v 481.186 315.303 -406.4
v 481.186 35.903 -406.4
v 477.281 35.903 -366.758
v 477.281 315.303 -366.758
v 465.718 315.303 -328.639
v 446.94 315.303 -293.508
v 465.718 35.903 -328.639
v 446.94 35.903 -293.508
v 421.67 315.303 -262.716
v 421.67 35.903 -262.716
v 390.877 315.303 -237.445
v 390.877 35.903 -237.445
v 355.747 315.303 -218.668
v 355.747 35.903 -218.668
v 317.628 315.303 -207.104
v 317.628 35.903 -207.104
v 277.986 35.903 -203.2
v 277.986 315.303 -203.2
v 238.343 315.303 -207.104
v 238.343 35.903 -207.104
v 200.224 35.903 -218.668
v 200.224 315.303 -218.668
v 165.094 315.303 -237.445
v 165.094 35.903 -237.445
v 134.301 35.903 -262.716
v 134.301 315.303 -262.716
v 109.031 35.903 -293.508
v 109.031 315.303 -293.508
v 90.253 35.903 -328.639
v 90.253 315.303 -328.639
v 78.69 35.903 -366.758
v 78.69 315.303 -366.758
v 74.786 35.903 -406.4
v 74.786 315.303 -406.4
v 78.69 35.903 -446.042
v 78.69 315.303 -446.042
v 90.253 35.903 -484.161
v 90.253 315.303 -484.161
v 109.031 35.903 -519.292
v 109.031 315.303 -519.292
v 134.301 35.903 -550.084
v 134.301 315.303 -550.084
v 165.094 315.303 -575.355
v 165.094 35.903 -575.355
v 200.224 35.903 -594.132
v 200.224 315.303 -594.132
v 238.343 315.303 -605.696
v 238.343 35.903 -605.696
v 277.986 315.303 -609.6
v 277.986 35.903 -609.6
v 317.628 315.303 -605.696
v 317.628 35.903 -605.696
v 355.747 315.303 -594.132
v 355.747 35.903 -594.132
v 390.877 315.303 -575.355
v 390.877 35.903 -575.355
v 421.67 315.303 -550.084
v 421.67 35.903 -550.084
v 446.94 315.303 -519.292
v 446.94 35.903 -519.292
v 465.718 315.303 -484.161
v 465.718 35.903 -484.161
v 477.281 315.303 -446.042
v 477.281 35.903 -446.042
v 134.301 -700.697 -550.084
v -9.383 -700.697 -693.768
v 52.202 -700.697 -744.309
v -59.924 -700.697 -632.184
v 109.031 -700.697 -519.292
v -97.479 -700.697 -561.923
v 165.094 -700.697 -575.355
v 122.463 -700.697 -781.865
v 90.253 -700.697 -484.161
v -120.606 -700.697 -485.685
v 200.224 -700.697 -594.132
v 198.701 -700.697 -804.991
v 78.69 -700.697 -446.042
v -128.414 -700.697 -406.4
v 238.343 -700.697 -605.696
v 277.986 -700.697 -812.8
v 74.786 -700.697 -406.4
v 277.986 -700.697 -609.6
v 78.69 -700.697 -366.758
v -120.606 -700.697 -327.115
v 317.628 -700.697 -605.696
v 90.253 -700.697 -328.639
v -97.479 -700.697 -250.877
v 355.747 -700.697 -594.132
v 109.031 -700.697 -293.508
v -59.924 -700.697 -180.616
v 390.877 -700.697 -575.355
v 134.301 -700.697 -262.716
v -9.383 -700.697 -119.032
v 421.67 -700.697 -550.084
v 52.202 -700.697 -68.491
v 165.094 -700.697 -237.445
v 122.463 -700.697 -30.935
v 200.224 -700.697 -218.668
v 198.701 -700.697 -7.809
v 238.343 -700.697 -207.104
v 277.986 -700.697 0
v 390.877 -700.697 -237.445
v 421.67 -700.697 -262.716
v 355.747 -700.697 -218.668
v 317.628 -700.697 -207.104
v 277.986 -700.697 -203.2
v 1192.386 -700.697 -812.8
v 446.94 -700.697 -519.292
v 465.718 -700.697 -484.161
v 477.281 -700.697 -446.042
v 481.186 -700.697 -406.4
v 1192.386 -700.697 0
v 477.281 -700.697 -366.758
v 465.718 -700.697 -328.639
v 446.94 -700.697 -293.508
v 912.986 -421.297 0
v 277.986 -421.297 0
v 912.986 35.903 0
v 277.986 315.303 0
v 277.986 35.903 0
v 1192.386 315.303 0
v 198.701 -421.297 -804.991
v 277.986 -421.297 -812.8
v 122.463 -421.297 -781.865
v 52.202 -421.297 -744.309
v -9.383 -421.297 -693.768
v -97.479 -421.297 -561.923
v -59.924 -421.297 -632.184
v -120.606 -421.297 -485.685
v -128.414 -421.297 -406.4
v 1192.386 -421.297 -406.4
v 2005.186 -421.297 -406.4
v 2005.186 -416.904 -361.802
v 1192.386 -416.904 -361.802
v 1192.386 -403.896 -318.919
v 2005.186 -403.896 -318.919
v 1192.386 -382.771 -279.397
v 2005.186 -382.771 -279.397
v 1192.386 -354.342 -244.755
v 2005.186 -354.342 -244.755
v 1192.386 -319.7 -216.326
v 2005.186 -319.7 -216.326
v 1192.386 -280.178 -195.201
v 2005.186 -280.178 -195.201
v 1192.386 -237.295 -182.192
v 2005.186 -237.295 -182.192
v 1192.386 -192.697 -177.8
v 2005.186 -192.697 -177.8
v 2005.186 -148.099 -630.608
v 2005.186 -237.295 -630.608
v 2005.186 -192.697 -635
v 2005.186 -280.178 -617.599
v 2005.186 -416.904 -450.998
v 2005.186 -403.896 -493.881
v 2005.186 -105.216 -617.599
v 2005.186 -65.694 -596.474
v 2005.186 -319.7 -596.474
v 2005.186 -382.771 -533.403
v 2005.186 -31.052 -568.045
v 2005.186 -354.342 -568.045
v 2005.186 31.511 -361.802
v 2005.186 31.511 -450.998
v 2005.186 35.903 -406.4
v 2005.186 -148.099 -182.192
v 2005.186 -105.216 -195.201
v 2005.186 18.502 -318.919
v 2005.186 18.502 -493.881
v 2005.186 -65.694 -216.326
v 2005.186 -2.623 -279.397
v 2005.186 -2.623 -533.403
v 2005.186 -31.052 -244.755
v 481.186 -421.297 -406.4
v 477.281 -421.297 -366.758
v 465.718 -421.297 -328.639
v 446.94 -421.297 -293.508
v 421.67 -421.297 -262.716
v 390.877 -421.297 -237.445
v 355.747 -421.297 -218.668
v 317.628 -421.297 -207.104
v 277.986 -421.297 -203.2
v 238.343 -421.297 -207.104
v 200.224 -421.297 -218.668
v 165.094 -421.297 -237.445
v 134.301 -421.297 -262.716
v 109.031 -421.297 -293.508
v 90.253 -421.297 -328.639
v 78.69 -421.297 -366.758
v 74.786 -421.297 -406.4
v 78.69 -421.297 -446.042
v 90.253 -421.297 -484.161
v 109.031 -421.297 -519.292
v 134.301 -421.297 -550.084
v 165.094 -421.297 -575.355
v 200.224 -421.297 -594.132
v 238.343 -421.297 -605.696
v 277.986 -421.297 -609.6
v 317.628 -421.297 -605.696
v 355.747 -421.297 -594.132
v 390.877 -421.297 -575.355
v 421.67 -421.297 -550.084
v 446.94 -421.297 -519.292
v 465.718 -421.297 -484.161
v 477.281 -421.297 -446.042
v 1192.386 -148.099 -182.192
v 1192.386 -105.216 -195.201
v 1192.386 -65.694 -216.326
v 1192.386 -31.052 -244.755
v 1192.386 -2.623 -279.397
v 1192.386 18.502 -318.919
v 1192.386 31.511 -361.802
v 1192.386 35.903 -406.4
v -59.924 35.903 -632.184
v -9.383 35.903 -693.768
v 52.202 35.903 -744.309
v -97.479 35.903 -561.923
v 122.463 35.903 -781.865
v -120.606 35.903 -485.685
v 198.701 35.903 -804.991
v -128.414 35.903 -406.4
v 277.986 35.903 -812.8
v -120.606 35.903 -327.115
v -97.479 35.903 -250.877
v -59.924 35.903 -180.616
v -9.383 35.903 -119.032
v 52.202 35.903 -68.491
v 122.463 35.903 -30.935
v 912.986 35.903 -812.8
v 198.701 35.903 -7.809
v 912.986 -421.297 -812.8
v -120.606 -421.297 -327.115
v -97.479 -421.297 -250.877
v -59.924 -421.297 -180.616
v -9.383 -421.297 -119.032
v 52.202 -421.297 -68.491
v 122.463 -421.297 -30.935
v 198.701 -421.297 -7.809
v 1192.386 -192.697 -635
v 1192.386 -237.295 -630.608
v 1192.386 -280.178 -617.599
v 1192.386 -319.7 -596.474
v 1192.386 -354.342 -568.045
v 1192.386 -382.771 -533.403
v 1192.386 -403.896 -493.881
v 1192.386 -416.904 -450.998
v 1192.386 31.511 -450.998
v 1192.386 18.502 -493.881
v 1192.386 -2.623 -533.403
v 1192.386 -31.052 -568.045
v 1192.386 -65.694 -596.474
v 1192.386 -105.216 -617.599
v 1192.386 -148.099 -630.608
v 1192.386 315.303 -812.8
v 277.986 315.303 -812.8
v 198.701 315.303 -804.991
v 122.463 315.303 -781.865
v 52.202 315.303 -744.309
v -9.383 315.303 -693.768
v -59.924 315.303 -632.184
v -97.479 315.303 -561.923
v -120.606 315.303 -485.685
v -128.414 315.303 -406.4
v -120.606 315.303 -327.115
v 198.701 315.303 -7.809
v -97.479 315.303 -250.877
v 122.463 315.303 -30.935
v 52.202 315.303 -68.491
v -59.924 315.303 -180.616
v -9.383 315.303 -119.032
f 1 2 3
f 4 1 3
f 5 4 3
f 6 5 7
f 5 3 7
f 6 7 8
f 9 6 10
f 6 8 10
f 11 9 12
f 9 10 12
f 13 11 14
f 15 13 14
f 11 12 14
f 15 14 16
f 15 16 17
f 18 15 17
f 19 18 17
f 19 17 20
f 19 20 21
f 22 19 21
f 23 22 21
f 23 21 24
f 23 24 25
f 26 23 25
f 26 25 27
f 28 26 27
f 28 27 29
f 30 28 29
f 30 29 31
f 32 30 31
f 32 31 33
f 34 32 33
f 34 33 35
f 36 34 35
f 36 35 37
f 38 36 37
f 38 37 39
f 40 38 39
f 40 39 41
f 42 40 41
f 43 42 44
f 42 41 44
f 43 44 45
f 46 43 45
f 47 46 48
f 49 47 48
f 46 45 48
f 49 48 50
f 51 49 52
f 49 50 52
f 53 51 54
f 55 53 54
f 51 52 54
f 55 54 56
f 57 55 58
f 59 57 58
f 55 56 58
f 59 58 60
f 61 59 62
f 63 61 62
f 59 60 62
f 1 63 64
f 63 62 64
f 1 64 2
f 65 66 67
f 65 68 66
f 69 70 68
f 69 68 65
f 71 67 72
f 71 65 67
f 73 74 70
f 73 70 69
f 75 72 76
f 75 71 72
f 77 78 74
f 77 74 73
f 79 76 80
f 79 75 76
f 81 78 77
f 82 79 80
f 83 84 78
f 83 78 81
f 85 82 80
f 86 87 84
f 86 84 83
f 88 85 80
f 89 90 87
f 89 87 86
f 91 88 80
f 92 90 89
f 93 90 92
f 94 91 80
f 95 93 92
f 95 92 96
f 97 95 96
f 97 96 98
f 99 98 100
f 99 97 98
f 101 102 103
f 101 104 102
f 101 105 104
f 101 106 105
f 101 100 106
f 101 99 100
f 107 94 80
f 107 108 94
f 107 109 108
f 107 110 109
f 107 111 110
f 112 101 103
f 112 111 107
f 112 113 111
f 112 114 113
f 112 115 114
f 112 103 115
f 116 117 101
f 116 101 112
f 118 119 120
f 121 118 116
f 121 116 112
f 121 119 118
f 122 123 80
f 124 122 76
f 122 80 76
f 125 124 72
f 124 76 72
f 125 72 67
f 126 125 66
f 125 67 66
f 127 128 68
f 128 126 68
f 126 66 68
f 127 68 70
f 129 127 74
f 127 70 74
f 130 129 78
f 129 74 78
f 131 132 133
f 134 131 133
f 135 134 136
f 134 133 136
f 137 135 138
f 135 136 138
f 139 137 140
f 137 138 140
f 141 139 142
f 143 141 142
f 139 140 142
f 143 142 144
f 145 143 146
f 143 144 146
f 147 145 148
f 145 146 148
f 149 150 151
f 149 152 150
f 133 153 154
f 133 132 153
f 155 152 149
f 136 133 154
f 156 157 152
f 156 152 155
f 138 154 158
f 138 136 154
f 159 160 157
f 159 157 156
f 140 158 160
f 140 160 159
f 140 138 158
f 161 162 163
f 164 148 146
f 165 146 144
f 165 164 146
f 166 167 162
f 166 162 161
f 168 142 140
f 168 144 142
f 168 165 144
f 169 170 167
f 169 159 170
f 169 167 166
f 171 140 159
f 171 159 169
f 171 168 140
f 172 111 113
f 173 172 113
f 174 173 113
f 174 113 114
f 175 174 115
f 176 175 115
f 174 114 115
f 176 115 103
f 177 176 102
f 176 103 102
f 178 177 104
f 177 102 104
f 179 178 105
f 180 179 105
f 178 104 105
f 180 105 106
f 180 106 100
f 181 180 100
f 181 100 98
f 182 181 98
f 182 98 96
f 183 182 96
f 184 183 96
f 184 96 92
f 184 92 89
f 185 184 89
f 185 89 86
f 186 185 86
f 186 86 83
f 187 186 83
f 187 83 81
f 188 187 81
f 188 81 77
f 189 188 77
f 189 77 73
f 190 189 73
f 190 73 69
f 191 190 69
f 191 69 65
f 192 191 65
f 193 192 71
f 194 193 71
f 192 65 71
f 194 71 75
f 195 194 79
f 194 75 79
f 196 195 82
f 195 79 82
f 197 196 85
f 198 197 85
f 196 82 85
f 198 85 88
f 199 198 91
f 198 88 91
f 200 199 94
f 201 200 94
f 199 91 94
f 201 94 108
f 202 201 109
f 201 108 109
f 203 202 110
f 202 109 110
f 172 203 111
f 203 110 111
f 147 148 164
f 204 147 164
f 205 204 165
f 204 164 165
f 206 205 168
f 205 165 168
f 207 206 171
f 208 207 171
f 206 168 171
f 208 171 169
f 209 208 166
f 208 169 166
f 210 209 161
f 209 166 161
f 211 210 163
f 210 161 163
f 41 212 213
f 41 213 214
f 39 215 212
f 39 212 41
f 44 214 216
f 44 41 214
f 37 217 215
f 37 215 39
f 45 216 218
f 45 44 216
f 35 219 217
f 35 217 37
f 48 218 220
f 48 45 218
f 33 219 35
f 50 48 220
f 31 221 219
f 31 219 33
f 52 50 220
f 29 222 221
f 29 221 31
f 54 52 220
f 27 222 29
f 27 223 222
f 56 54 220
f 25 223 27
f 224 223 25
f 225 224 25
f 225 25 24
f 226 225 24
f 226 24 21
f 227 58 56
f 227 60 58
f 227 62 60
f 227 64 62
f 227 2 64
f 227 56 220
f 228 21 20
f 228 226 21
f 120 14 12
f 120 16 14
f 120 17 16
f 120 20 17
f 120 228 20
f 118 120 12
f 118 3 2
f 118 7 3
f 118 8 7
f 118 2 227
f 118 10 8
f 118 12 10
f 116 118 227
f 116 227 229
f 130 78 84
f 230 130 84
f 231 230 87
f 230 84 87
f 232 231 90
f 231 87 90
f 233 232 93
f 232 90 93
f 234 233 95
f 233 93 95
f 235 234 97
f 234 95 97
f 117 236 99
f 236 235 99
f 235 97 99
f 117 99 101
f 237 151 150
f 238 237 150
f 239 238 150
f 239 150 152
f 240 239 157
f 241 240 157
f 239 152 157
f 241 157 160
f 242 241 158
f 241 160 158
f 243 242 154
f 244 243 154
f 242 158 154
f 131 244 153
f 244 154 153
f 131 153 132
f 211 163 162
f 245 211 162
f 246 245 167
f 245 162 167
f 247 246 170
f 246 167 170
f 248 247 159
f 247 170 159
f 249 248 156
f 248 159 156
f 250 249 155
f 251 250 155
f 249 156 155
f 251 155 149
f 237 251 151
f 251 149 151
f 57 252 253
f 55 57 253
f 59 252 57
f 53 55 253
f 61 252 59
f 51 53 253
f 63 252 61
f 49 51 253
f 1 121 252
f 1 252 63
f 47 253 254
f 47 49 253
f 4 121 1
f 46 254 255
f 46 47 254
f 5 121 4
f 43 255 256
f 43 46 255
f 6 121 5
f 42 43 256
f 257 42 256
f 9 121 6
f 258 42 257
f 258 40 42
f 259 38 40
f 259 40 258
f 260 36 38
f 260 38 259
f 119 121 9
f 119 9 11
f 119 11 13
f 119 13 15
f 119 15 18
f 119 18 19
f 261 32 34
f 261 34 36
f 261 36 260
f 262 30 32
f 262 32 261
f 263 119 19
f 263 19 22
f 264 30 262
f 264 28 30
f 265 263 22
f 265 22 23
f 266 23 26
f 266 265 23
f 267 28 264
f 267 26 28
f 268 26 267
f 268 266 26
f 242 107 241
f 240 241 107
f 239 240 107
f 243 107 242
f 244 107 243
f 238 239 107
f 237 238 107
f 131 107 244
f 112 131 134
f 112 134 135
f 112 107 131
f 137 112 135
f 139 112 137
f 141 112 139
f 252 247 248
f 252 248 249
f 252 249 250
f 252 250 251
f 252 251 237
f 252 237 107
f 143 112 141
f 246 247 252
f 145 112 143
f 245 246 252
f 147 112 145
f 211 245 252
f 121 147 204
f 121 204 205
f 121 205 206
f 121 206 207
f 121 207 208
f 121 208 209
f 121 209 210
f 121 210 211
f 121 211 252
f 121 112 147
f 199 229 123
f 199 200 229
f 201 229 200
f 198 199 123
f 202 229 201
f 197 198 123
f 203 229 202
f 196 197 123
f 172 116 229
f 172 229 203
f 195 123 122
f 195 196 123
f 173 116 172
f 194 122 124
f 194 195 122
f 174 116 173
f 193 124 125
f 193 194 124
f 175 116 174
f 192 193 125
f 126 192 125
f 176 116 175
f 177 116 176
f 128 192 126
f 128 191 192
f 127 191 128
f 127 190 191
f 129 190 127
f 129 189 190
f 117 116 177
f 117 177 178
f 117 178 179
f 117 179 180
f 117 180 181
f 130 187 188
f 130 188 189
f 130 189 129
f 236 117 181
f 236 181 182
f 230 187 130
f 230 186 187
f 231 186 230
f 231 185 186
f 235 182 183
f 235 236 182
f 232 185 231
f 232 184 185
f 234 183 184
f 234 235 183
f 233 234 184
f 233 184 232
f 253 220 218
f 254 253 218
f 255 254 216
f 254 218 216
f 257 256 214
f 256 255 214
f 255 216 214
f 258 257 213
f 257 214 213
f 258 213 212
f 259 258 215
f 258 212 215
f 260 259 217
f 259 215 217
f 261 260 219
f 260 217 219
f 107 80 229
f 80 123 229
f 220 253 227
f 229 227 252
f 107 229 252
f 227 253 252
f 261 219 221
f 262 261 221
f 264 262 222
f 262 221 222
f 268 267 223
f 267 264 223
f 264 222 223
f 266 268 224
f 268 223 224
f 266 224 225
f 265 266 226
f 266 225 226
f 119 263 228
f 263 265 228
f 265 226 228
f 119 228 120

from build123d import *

# Parameters (mm, degrees)
F1_DEPTH = 812.8
F2_W     = 812.8
F2_H     = 177.8
F3_DEPTH = 736.601
F4_R     = 203.2
F5_DEPTH = 1016.001
F7_DEPTH = 812.8


with BuildPart() as f1:
    # F0 (on Top) → F1 (new body)
    with BuildSketch(Plane.XY):
        Polygon((1192.385533, 315.303055), (-128.414467, 315.303055), (-128.414467, 35.903055), (912.985533, 35.903055), (912.985533, -421.296945), (-128.414467, -421.296945), (-128.414467, -700.696945), (1192.385533, -700.696945), (1192.385533, -421.296945), (2005.185533, -421.296945), (2005.185533, 35.903055), (1192.385533, 35.903055), align=None)
    extrude(amount=-F1_DEPTH)

    # F2 (on face) → F3 (cut, through all)
    with BuildSketch(Plane.XZ.offset(421.296945)):
        with Locations((1598.785533, -88.9)):
            Rectangle(F2_W, F2_H)
        with Locations((1598.785533, -723.9)):
            Rectangle(F2_W, F2_H)
    extrude(amount=-F3_DEPTH, mode=Mode.SUBTRACT)

    # F4 (on face) → F5 (cut, through all)
    with BuildSketch(Plane.XZ.offset(700.696945)):
        with BuildLine():
            ThreePointArc((-128.414467, -406.4), (-9.382663, -119.031804), (277.985533, 0))
            Line((277.985533, 0), (-128.414467, 0))
            Line((-128.414467, 0), (-128.414467, -406.4))
        make_face()
        with BuildLine():
            ThreePointArc((277.985533, -812.8), (-9.382663, -693.768196), (-128.414467, -406.4))
            Line((-128.414467, -406.4), (-128.414467, -812.8))
            Line((-128.414467, -812.8), (277.985533, -812.8))
        make_face()
        with Locations((277.985533, -406.4)):
            Circle(F4_R)
    extrude(amount=-F5_DEPTH, mode=Mode.SUBTRACT)

    # F6 (on face) → F7 (cut)
    with BuildSketch(Plane.YZ.offset(2005.185533)):
        with BuildLine():
            Line((-421.296945, -635), (-192.696945, -635))
            ThreePointArc((-192.696945, -635), (-354.341555, -568.04461), (-421.296945, -406.4))
            Line((-421.296945, -406.4), (-421.296945, -635))
        make_face()
        with BuildLine():
            Line((35.903055, -635), (35.903055, -406.4))
            ThreePointArc((35.903055, -406.4), (-31.052335, -568.04461), (-192.696945, -635))
            Line((-192.696945, -635), (35.903055, -635))
        make_face()
        with BuildLine():
            ThreePointArc((-421.296945, -406.4), (-354.341555, -244.75539), (-192.696945, -177.8))
            Line((-192.696945, -177.8), (-421.296945, -177.8))
            Line((-421.296945, -177.8), (-421.296945, -406.4))
        make_face()
        with BuildLine():
            ThreePointArc((-192.696945, -177.8), (-31.052335, -244.75539), (35.903055, -406.4))
            Line((35.903055, -406.4), (35.903055, -177.8))
            Line((35.903055, -177.8), (-192.696945, -177.8))
        make_face()
    extrude(amount=-F7_DEPTH, mode=Mode.SUBTRACT)


solid = f1.part
